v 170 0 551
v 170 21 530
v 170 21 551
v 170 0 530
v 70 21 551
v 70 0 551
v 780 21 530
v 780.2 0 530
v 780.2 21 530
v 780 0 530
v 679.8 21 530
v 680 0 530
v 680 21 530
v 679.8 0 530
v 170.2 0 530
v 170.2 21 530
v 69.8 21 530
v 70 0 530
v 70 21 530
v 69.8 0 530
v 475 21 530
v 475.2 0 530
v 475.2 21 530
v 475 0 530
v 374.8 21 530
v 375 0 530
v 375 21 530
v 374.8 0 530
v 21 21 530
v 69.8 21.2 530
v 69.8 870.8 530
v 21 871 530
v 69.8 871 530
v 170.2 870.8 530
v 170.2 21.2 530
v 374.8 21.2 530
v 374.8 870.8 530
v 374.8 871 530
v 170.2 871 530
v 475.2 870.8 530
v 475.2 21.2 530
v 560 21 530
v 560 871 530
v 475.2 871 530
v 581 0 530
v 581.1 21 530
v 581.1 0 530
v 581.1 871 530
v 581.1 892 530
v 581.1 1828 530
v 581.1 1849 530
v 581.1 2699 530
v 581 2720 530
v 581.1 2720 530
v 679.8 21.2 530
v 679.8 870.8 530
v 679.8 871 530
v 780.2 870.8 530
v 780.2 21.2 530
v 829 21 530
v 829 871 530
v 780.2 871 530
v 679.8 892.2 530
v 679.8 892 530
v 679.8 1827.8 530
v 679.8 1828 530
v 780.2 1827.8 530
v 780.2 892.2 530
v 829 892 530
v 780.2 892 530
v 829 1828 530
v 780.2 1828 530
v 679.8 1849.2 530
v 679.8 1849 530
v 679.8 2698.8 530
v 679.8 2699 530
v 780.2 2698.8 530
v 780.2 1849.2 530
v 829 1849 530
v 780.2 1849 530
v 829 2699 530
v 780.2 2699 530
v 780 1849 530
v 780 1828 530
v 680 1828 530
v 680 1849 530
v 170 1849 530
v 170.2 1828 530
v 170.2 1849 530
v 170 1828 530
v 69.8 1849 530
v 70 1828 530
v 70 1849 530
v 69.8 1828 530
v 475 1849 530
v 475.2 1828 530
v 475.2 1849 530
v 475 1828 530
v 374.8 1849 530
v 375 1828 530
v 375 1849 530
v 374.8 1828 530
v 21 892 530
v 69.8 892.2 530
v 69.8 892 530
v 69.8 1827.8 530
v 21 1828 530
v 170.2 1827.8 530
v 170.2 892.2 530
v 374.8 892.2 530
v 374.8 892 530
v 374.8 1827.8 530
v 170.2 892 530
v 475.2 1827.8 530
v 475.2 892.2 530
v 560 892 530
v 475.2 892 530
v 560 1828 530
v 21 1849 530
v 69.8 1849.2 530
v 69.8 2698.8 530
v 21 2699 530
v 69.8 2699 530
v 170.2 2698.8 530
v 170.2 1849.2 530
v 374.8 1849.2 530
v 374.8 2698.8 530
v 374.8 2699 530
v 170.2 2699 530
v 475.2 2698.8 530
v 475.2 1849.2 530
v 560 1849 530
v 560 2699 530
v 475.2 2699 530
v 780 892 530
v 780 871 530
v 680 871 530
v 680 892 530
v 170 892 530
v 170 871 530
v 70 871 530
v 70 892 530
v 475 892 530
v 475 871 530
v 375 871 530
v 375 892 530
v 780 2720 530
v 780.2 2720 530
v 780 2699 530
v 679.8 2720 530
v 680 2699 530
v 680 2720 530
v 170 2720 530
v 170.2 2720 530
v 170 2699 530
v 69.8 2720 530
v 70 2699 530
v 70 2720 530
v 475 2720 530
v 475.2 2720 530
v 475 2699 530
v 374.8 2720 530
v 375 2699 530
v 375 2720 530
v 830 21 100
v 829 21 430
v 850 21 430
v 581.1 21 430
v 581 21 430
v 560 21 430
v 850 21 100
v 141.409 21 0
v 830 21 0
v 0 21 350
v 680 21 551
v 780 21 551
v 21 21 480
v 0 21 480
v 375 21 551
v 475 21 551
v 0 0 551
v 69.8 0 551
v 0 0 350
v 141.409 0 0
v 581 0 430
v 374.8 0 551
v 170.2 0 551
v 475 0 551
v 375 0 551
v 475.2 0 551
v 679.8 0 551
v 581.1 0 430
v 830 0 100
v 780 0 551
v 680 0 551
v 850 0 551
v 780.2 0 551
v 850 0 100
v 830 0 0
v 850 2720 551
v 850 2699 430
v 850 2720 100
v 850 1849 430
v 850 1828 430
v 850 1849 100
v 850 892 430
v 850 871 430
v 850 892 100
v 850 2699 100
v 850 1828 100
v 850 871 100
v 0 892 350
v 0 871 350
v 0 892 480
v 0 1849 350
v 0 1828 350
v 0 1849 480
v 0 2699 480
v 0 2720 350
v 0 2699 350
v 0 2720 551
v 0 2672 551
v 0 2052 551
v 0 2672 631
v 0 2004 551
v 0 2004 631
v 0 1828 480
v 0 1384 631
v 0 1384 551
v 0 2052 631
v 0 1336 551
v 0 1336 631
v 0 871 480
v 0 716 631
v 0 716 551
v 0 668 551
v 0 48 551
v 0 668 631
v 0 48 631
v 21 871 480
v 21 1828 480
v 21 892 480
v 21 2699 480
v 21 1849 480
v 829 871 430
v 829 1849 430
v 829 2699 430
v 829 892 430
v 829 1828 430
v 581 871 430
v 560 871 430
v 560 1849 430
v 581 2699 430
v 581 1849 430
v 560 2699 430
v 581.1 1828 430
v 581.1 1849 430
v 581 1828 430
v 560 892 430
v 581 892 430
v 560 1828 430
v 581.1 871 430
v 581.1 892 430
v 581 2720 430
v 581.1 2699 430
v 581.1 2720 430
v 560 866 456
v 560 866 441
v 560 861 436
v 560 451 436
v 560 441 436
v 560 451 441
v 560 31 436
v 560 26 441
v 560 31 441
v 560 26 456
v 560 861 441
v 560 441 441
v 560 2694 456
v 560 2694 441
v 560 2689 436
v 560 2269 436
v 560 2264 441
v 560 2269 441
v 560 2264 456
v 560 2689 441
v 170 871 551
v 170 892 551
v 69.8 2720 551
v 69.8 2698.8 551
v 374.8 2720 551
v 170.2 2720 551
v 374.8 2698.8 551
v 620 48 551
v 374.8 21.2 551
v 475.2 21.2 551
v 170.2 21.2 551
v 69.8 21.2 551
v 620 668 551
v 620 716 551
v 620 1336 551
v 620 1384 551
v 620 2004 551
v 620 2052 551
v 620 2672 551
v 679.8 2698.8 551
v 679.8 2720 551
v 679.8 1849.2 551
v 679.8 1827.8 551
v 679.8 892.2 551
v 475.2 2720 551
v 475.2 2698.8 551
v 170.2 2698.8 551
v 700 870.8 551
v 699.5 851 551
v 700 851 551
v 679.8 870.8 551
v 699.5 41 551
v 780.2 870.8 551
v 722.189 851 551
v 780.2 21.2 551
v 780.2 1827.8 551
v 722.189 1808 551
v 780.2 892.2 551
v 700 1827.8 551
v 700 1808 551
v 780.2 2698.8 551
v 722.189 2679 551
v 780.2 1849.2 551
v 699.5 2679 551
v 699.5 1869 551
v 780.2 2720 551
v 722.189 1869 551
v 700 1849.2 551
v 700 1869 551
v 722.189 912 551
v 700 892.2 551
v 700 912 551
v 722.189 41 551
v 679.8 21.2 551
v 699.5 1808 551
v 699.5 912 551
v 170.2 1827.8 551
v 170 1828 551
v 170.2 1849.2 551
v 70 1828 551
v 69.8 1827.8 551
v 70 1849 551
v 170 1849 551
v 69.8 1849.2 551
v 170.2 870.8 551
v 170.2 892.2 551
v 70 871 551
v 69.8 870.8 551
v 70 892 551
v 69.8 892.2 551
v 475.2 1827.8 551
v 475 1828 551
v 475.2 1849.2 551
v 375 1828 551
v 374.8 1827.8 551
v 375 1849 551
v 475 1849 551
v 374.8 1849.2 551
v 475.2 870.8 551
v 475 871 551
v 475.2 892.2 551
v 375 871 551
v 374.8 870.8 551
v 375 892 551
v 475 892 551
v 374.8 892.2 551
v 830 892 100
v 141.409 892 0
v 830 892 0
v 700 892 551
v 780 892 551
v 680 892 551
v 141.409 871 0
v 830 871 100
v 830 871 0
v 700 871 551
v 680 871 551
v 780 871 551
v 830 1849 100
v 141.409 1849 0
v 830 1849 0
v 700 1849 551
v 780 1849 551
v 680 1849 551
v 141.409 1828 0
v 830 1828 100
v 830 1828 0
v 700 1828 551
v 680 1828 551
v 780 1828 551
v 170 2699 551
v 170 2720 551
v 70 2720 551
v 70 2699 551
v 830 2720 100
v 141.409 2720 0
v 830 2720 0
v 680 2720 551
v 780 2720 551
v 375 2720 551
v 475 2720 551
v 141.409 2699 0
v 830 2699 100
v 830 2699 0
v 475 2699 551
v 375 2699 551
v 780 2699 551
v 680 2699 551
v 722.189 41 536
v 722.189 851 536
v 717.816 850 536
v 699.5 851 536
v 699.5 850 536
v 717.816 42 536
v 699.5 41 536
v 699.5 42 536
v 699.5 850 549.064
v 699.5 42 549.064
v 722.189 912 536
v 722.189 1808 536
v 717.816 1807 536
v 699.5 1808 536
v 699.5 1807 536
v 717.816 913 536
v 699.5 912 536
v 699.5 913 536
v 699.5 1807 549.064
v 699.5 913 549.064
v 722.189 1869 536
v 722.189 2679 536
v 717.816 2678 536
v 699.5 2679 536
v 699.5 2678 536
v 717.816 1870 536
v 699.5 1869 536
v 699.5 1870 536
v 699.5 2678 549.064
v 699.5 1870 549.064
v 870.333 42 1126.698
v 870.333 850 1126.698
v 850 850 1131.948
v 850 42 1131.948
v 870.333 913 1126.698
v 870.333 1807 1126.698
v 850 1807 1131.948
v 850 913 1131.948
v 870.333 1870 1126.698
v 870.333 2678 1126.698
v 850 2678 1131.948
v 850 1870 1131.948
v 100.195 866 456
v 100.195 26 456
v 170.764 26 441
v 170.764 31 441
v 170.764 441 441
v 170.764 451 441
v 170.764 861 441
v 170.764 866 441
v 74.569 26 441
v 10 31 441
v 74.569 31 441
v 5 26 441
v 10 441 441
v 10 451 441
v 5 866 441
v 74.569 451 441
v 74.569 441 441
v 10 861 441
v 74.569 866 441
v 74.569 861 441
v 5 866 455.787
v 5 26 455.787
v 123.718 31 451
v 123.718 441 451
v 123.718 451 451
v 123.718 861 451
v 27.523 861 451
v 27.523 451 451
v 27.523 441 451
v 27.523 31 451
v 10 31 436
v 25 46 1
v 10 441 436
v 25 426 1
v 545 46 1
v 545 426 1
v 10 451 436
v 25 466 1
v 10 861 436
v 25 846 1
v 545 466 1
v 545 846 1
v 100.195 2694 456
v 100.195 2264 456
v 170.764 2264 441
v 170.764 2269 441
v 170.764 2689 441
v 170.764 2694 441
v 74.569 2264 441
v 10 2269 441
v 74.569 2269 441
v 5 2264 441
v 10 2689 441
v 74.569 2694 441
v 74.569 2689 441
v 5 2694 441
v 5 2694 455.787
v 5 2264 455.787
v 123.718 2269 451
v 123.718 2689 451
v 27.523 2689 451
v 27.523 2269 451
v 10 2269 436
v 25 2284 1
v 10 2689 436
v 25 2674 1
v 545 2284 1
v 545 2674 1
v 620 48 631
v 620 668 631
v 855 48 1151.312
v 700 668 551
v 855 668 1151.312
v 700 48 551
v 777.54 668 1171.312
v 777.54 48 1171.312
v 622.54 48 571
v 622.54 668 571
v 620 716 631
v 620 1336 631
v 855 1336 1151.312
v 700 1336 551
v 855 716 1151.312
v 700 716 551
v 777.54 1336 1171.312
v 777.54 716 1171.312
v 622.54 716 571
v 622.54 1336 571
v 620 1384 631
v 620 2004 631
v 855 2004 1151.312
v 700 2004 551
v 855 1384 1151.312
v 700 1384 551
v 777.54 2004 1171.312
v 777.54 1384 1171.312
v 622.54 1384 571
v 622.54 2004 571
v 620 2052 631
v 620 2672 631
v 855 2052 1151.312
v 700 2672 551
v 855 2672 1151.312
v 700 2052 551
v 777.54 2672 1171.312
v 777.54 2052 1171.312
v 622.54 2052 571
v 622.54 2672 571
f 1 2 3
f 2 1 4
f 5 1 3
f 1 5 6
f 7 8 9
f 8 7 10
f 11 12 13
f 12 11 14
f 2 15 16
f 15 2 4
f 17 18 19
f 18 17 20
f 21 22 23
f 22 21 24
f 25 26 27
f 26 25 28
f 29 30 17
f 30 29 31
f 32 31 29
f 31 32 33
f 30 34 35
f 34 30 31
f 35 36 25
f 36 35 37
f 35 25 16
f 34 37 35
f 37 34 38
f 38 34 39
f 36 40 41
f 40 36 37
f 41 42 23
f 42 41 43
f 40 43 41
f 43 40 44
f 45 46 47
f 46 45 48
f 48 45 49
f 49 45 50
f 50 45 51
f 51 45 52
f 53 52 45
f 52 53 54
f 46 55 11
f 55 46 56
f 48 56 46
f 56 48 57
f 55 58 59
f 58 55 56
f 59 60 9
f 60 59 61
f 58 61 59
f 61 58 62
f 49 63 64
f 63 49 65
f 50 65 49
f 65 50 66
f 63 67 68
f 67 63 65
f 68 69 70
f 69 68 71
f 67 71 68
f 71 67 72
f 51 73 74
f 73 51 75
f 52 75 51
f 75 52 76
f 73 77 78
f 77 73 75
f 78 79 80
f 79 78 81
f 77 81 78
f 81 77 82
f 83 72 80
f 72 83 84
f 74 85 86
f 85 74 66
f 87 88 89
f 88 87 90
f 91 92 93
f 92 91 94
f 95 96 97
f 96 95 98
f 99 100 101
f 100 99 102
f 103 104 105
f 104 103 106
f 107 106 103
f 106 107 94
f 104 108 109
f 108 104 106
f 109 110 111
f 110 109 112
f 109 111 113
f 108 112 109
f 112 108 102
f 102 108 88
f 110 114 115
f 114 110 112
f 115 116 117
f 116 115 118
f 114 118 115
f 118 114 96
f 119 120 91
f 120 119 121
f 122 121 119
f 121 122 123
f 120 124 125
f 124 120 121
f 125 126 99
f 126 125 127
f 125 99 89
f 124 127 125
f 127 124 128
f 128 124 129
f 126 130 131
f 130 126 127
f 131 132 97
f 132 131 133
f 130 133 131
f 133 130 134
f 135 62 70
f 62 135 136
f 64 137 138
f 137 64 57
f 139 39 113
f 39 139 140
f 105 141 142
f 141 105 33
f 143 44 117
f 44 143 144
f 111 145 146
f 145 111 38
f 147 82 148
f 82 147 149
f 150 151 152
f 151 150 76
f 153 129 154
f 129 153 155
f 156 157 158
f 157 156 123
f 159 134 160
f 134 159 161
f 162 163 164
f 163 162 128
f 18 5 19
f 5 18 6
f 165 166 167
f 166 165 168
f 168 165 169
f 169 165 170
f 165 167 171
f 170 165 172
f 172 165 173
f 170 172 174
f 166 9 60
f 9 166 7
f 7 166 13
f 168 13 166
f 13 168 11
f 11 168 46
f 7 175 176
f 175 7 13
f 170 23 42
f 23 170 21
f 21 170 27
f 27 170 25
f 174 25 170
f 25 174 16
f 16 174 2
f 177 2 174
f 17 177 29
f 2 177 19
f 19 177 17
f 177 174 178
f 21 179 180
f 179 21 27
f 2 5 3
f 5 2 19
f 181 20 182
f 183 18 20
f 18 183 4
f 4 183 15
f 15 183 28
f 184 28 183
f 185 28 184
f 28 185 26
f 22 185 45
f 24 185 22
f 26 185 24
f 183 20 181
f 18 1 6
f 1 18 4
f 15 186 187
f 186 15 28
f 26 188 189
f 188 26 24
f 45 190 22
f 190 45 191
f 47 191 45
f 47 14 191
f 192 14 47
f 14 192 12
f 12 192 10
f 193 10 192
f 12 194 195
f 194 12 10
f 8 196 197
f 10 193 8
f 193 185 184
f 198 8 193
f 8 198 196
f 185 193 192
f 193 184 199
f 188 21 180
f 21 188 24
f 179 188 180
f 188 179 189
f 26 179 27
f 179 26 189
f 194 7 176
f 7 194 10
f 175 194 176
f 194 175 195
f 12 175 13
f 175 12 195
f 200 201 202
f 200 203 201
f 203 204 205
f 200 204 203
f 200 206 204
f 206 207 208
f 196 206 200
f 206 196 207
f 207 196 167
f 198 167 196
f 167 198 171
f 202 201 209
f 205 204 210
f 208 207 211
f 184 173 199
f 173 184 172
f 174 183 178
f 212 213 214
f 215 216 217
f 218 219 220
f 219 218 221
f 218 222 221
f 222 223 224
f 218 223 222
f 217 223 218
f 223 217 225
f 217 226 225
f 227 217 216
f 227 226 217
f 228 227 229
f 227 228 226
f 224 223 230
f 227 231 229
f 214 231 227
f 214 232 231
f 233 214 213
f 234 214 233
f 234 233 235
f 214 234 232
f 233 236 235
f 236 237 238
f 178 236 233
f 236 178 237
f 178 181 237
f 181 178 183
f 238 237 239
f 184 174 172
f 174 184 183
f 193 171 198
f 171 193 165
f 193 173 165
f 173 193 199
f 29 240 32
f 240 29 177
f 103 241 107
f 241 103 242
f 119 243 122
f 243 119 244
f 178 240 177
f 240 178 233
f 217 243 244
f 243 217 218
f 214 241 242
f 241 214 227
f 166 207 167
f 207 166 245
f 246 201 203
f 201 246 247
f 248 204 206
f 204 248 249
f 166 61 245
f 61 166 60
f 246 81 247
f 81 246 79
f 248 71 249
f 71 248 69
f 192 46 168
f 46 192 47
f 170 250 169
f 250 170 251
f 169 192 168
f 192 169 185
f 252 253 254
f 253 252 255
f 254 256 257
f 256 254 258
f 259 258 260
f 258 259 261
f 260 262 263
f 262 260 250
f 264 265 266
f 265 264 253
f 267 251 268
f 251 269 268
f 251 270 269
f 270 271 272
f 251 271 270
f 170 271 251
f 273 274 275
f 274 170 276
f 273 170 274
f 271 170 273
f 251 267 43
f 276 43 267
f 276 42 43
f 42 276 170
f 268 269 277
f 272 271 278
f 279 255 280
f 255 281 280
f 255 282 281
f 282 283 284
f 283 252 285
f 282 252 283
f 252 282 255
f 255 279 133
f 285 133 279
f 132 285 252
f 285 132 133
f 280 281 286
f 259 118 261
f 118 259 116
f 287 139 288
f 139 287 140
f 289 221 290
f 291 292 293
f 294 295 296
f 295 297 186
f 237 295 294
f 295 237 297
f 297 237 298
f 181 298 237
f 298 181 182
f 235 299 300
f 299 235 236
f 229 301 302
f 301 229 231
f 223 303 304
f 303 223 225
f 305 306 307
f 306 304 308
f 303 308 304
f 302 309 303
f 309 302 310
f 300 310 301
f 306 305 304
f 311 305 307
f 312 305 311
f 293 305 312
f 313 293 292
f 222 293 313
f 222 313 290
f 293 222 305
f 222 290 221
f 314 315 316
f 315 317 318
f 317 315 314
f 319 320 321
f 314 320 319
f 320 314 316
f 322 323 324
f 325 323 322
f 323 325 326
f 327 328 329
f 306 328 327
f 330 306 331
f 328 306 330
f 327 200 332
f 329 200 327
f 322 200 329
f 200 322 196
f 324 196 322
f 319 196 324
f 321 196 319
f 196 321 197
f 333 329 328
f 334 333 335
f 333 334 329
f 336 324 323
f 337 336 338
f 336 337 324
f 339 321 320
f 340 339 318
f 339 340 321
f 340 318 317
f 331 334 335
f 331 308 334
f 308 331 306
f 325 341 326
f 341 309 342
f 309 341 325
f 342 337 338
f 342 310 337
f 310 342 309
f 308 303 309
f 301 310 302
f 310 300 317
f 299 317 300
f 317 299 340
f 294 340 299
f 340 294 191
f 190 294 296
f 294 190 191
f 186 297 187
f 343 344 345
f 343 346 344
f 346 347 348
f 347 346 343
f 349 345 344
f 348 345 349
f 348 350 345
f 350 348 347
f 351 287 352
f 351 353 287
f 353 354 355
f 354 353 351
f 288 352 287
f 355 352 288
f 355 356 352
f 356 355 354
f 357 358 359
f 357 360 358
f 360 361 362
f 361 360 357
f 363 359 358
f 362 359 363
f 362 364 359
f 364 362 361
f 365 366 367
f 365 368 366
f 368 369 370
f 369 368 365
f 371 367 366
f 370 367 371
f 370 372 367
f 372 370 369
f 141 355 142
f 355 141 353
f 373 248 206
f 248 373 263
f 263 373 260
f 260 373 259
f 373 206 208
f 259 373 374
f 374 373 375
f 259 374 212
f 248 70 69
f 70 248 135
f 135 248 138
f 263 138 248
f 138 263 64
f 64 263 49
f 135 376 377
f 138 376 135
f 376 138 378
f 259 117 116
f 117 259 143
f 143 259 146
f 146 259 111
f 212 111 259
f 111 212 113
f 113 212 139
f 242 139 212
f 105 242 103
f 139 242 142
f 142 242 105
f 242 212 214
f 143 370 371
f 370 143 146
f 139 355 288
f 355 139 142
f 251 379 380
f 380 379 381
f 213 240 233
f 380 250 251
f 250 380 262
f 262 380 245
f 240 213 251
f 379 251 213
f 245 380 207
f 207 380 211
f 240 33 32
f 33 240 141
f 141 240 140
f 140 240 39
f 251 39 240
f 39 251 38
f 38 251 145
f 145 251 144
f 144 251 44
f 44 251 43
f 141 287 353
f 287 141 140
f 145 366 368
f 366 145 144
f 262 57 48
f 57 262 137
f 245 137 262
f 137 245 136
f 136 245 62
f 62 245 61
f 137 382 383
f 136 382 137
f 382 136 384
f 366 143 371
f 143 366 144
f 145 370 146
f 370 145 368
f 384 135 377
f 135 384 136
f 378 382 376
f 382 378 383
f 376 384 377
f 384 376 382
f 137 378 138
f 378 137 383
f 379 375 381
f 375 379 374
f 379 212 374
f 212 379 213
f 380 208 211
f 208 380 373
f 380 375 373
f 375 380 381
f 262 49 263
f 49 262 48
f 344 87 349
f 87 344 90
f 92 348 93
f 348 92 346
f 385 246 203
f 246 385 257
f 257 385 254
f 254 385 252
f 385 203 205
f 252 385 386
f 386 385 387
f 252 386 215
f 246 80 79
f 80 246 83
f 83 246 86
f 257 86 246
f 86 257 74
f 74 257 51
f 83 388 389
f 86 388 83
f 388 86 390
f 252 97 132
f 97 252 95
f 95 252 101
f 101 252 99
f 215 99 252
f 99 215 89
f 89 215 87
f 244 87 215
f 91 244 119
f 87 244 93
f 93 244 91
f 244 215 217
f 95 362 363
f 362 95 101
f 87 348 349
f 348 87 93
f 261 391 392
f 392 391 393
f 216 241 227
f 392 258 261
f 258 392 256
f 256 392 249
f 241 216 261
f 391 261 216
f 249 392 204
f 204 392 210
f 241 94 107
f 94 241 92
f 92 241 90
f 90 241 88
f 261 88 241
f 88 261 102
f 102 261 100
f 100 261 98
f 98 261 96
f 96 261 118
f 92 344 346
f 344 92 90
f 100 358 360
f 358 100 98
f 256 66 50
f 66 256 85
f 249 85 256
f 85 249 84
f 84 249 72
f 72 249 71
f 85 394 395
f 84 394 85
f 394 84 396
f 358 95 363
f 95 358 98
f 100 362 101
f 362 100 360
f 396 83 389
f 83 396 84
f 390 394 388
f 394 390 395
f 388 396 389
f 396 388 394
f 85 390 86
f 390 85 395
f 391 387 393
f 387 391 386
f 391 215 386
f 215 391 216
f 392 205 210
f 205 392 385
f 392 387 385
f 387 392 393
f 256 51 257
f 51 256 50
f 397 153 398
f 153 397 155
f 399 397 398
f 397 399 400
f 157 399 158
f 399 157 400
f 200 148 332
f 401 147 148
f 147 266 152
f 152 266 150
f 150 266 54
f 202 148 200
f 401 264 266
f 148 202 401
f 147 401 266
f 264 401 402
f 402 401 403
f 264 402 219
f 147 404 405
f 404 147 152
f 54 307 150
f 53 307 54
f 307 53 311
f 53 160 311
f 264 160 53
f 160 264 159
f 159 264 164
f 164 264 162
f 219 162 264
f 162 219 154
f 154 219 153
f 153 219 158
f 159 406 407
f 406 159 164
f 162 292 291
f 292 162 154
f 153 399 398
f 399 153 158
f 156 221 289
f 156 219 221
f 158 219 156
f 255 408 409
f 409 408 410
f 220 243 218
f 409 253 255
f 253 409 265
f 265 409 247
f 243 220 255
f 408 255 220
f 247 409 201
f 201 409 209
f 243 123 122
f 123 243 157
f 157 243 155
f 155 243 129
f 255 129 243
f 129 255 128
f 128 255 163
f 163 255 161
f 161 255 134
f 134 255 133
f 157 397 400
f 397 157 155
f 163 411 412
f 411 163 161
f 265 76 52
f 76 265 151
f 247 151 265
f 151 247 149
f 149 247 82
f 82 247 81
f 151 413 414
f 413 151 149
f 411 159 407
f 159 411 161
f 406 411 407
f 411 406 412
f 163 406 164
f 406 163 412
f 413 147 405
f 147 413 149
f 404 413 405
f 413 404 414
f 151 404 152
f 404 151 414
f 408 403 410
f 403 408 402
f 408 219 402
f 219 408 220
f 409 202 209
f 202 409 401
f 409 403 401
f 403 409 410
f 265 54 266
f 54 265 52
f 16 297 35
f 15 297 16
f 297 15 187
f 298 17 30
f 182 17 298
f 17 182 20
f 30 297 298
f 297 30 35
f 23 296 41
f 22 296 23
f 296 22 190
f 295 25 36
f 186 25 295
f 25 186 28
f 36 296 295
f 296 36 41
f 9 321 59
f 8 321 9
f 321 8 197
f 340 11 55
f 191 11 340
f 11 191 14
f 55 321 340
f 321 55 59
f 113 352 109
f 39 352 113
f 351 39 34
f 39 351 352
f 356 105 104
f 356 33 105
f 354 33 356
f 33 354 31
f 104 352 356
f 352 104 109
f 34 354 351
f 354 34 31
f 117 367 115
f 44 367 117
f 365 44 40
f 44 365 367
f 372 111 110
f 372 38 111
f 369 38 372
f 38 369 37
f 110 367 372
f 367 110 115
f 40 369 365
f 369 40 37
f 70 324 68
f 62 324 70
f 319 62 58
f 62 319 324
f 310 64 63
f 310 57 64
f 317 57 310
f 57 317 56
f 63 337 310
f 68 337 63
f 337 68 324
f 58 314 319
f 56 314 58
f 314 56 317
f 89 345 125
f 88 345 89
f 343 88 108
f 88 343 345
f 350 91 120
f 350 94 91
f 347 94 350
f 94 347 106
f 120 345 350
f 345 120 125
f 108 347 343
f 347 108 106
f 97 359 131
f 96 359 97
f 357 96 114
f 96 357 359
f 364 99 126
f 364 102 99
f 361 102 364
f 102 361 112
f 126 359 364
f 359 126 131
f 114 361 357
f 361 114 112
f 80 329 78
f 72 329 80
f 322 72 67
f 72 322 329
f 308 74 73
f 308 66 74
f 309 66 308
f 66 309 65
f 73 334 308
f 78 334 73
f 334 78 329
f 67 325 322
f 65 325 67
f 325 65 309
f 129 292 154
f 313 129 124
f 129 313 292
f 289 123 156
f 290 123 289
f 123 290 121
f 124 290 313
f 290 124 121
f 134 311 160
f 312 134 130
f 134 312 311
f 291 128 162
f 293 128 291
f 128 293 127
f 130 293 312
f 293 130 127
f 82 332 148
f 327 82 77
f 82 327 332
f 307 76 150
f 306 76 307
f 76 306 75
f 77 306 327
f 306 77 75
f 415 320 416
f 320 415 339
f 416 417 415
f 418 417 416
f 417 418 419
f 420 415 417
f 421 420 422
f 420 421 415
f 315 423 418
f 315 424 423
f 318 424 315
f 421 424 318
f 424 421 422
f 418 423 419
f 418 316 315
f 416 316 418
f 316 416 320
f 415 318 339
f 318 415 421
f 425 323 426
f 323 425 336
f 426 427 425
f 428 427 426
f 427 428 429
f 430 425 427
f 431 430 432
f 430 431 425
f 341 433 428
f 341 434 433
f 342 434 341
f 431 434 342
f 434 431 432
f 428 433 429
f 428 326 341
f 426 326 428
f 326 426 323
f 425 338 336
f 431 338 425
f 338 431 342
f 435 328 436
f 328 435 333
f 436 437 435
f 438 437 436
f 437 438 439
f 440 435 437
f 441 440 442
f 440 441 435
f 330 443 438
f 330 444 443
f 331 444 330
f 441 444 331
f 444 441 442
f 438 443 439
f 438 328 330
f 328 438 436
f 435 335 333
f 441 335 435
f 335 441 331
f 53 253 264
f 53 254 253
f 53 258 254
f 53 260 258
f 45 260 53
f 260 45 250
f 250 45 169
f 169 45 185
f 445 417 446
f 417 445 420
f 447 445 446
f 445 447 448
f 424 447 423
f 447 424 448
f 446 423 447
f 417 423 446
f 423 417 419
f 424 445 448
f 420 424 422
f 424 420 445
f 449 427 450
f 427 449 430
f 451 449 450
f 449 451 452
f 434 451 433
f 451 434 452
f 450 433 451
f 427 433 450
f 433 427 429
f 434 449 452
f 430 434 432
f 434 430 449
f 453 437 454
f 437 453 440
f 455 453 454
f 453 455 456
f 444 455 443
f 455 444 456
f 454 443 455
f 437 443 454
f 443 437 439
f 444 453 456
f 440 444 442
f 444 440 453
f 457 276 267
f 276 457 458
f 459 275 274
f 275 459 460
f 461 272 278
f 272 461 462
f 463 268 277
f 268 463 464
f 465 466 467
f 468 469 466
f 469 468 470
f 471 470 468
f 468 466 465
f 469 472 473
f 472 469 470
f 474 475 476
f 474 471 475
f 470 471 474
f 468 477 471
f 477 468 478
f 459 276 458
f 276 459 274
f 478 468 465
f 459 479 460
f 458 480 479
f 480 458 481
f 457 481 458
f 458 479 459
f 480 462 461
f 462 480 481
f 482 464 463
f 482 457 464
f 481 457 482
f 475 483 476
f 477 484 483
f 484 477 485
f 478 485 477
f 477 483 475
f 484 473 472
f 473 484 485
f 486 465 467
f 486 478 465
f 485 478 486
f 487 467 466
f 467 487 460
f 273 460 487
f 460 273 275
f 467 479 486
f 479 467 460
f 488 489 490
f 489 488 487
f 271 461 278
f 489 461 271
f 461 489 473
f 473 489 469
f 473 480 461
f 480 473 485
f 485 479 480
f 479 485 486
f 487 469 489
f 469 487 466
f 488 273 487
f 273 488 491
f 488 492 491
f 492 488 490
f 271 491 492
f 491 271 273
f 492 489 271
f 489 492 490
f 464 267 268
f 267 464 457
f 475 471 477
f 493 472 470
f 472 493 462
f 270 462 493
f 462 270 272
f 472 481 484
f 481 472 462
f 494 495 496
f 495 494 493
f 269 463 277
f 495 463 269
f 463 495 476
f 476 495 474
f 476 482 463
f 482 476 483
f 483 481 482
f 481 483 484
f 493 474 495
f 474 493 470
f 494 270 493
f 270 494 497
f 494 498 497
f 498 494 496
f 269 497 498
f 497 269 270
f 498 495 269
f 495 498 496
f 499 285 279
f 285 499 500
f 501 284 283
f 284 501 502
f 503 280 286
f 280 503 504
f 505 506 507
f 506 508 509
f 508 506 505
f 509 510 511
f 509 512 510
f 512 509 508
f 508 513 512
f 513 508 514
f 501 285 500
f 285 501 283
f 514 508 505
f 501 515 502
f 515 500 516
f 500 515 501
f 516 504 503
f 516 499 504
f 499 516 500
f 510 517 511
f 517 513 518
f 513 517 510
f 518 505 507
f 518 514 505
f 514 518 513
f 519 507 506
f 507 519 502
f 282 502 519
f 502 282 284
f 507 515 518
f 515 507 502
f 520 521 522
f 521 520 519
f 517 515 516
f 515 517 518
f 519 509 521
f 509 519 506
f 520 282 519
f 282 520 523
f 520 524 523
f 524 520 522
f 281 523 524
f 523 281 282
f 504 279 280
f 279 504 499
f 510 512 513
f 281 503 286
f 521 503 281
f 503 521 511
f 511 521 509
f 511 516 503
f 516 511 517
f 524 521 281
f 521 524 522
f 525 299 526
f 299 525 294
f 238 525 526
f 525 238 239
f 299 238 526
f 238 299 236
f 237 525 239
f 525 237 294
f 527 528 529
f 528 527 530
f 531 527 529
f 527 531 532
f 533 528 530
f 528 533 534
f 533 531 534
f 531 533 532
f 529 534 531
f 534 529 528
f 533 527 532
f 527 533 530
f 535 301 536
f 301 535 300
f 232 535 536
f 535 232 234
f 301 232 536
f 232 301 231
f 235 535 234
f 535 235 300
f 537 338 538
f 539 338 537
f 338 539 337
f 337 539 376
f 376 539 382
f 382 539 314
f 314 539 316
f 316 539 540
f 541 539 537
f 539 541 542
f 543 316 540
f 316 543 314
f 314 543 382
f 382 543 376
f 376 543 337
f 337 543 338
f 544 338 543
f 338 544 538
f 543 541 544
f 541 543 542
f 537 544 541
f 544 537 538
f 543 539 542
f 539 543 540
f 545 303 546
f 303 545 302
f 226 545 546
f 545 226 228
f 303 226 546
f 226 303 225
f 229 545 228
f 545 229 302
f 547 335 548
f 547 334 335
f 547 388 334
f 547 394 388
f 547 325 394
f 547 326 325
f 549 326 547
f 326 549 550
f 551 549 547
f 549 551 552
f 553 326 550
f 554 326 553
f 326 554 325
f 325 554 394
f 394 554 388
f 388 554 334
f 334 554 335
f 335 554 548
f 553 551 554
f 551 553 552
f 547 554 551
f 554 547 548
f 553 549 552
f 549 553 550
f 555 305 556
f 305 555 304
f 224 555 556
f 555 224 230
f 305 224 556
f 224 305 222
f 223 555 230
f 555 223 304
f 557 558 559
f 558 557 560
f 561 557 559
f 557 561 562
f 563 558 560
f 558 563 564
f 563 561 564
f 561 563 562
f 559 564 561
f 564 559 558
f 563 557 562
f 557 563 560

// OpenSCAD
// ==========================================
// Project: Terrace-Bench
// File: Terrace-Bench.scad
// Version: v0.06
// Description: Fully parametric 21mm plywood terrace bench
//              Designed to fit a 276cm wall-to-wall alcove.
//              Fits 4 Ikea SORTERA boxes underneath (2 on left, 2 on right).
//              Fits 62x62cm Ikea garden pillows for seat and backrest.
//              Supports 3 modes: "assembled", "exploded", "parts" (flat lay for CNC).
// Changelog:
//   v0.01 - Initial design
//   v0.02 - Corrected backrest lean, adjusted SORTERA box orientation,
//           added 50mm front reinforcement beam, raised clearance to 530mm
//           (bottom of beam to floor = 480mm), calculated parallel 22-degree
//           toe-kick profile, added 20mm shoulder to hide grooves, and
//           aligned all parts flat on Z=0 plane.
//   v0.03 - Made seat pillow visualization depth dynamically scale with
//           total_depth.
//   v0.04 - Reversed pillow stacking (backrest pillow down first, then seat).
//           Made seat_depth constant (620mm) so the sitting part never changes.
//           When total_depth changes, only the groove slope/position adapts.
//           Increased total_depth to 860mm to keep backrest slope ~14 degrees.
//   v0.05 - Confirmed backrest panel length calculation uses absolute wall distance
//           and touch height, uncoupled from sitting pillow depth.
//   v0.06 - Removed wall-touch-height parameter. Now explicitly defining the
//           backrest panel length (height) and dynamically calculating the slope.
// Author: Zed Coding Agent
// Date: 2026-05-30
// ==========================================

/* [Visualization Options] */
// Mode of display: assembled (3D), exploded (3D), parts (flat lay for CNC export)
mode = "assembled"; // [assembled, exploded, parts]
// Show pillows and Ikea SORTERA boxes
show_accessories = true;

/* [General Dimensions] */
// Wall-to-wall width of the terrace (mm)
total_width = 2720; // [2000:3500]
// Total depth of the bench top (mm) (Increased to 860 to maintain backrest slope)
total_depth = 850; // [750:1100]
// Depth of the sitting area (mm) (Fixed so pillows always fit regardless of total_depth)
seat_depth = 620; // [500:800]
// Thickness of the Ikea garden pillows (mm)
pillow_thickness = 80; // [50:150]
// Clearance height from floor to bottom of bench top (mm) (raised to 530mm so bottom of front apron is 480mm from floor)
clearance_height = 530; // [400:600]
// Plywood sheet thickness (mm)
plywood_thickness = 21; // [12:30]

/* [Compartment Options] */
// Width of the left compartment for SORTERA boxes (mm)
bay_width_left = 850; // [780:1200]
// Width of the right compartment for SORTERA boxes (mm)
bay_width_right = 850; // [780:1200]

/* [Backrest Options] */
// Total length (height) of the backrest wooden panel (mm)
backrest_panel_length = 600; // [400:1000]
// Gap between the backrest panels (mm)
backrest_panel_gap = 2; // [0:10]

/* [Joinery & Details] */
// Height of the toe-kick cutout at bottom-front of supports (mm)
toekick_height = 350; // [0:450]
// Angle of the toe-kick cutout from vertical (degrees) to match Sortera's front slant
toekick_angle = 22; // [0:45]
// Height of the skirting board notch at bottom-back of supports (mm)
skirting_height = 100; // [0:150]
// Depth of the skirting board notch (mm)
skirting_depth = 20; // [0:50]
// Number of tenons per support wall
tenon_count = 3; // [1:5]
// Width of each tenon along the depth of the bench (mm)
tenon_width = 100; // [50:200]
// Height of the structural aprons (stretchers) (mm)
apron_height = 100; // [60:150]
// Height of the vertical front reinforcement apron (mm)
front_apron_height = 50; // [30:100]
// X-coordinate of the middle apron (serves as box stop) (mm)
apron_middle_x = 560; // [400:700]

/* [Groove Options] */
// Whether the groove goes all the way through (through-slot)
groove_through = false;
// Depth of the pocket groove (if not through-slot) (mm)
groove_depth = 15; // [5:20]
// Solid wood shoulder (margin) left at the end of each bay section (mm)
groove_shoulder = 20; // [10:50]
// Tolerance clearance (slop) for joints/grooves (mm)
groove_slop = 1.0; // [0.1:2.0]
// Mortise clearance slop for tenons (mm)
mortise_slop = 0.2; // [0.0:1.0]

/* [Calculated Constants] */
// Middle bay width is calculated automatically to maintain total width
bay_width_middle = total_width - 4 * plywood_thickness - bay_width_left - bay_width_right;

// Calculated toe-kick depth based on height and angle
toekick_depth = toekick_height * tan(toekick_angle);

// Dynamic Backrest Position Logic
// The front of the groove is placed to exactly fit the seat_depth + the thickness of the backrest pillow.
groove_front_x = seat_depth + pillow_thickness;
// The distance from the groove to the back wall dictates the backrest angle.
groove_distance_calc = total_depth - groove_front_x;

// Backrest angle calculation (hypotenuse is backrest_panel_length, opposite is groove_distance_calc)
// Note: This calculates the exact angle required for the top of the panel to touch the back wall.
backrest_angle = asin(groove_distance_calc / backrest_panel_length);
L_total = backrest_panel_length;
groove_width_calc = plywood_thickness / cos(backrest_angle) + groove_slop;

// Apron X positions
apron_back_x = total_depth - plywood_thickness;

// Bay intervals: [start_y, end_y]
bay_intervals = [
    [plywood_thickness, plywood_thickness + bay_width_left],
    [2 * plywood_thickness + bay_width_left, 2 * plywood_thickness + bay_width_left + bay_width_middle],
    [3 * plywood_thickness + bay_width_left + bay_width_middle, total_width - plywood_thickness]
];

// Assembled Y-positions of the 4 support walls
support_y_positions = [
    0,
    plywood_thickness + bay_width_left,
    total_width - 2 * plywood_thickness - bay_width_right,
    total_width - plywood_thickness
];

// Nesting gap for "parts" mode flat lay
nesting_gap = 50;


// ==========================================
// Main Entry Point
// ==========================================

if (mode == "assembled") {
    assembly();
} else if (mode == "exploded") {
    exploded_assembly();
} else if (mode == "parts") {
    flat_lay_parts();
}


// ==========================================
// Modular Components
// ==========================================

// 1. Support Wall
// Local coordinates:
// X: [0, total_depth]
// Y: [0, plywood_thickness]
// Z: [0, clearance_height] (tenons go up to clearance_height + plywood_thickness)
module support_wall() {
    difference() {
        union() {
            // Main rectangular wall panel
            cube([total_depth, plywood_thickness, clearance_height]);

            // Tenons at the top for locking into bench top
            start_x = 120;
            end_x = total_depth - 120;
            for (i = [0 : tenon_count - 1]) {
                x_center = (tenon_count > 1) ?
                    (start_x + i * (end_x - start_x) / (tenon_count - 1)) :
                    (total_depth / 2);
                translate([x_center - tenon_width / 2, 0, clearance_height])
                    cube([tenon_width, plywood_thickness, plywood_thickness]);
            }
        }

        // Toe-kick cutout (diagonal at bottom-front)
        if (toekick_depth > 0 && toekick_height > 0) {
            translate([0, plywood_thickness + 0.05, 0])
                rotate([90, 0, 0])
                linear_extrude(height = plywood_thickness + 0.1)
                polygon([[0, 0], [toekick_depth, 0], [0, toekick_height]]);
        }

        // Skirting board notch (at bottom-back)
        if (skirting_depth > 0 && skirting_height > 0) {
            translate([total_depth - skirting_depth, -0.1, -0.1])
                cube([skirting_depth + 0.2, plywood_thickness + 0.2, skirting_height + 0.1]);
        }

        // Front Apron notch (at top-front vertical reinforcement)
        translate([-0.1, -0.1, clearance_height - front_apron_height])
            cube([plywood_thickness + 0.1, plywood_thickness + 0.2, front_apron_height + 0.1]);

        // Back Apron notch (at top-back)
        translate([apron_back_x, -0.1, clearance_height - apron_height])
            cube([plywood_thickness + 0.1, plywood_thickness + 0.2, apron_height + 0.1]);

        // Middle Apron notch (at top-middle)
        translate([apron_middle_x, -0.1, clearance_height - apron_height])
            cube([plywood_thickness + 0.1, plywood_thickness + 0.2, apron_height + 0.1]);
    }
}

// Helper: Generates tenon mortises for the bench top
module all_support_tenon_mortises() {
    for (y = support_y_positions) {
        translate([0, y, clearance_height]) {
            start_x = 120;
            end_x = total_depth - 120;
            for (i = [0 : tenon_count - 1]) {
                x_center = (tenon_count > 1) ?
                    (start_x + i * (end_x - start_x) / (tenon_count - 1)) :
                    (total_depth / 2);
                translate([
                    x_center - tenon_width / 2 - mortise_slop,
                    -mortise_slop,
                    -0.1
                ])
                    cube([
                        tenon_width + 2 * mortise_slop,
                        plywood_thickness + 2 * mortise_slop,
                        plywood_thickness + 0.2
                    ]);
            }
        }
    }
}

// Helper: Generates backrest grooves in the bench top
module backrest_grooves() {
    for (interval = bay_intervals) {
        y_start = interval[0] + groove_shoulder;
        y_end = interval[1] - groove_shoulder;
        y_len = y_end - y_start;

        translate([
            groove_front_x - groove_slop / 2,
            y_start,
            groove_through ? -0.1 : (plywood_thickness - groove_depth)
        ])
            cube([
                groove_width_calc,
                y_len,
                groove_through ? (plywood_thickness + 0.2) : (groove_depth + 0.1)
            ]);
    }
}

// 2. Bench Top
// Local coordinates:
// X: [0, total_depth]
// Y: [0, total_width]
// Z: [0, plywood_thickness]
module bench_top() {
    difference() {
        // Main flat bench top
        cube([total_depth, total_width, plywood_thickness]);

        // Subtraction of mortises (aligned to bench top height)
        translate([0, 0, -clearance_height])
            all_support_tenon_mortises();

        // Subtraction of grooves
        backrest_grooves();
    }
}

// 3. Structural Aprons (Back & Middle Stretchers)
// Local coordinates:
// X: [0, plywood_thickness]
// Y: [0, total_width]
// Z: [0, apron_height]
module apron() {
    cube([plywood_thickness, total_width, apron_height]);
}

// 3b. Vertical Front Reinforcement Apron
// Local coordinates:
// X: [0, plywood_thickness]
// Y: [0, total_width]
// Z: [0, front_apron_height]
module front_apron() {
    cube([plywood_thickness, total_width, front_apron_height]);
}

// 4. Backrest Panel
// Local coordinates:
// X: [0, plywood_thickness]
// Y: [0, panel_width]
// Z: [-groove_depth, L_total] (slanted)
module backrest_panel(panel_width) {
    // Note: To simplify CNC fabrication, the panel is drawn flat.
    // The bottom edge is perpendicular to its faces. Slit clearance in the groove allows tilting.
    translate([0, 0, -groove_depth])
        cube([plywood_thickness, panel_width, L_total + groove_depth]);
}


// ==========================================
// Assembly Layouts
// ==========================================

// Full 3D Assembled view
module assembly() {
    // Support walls (Wood Color)
    color("burlywood") {
        for (y = support_y_positions) {
            translate([0, y, 0])
                support_wall();
        }
    }

    // Bench Top (Wood Color)
    color("peru") {
        translate([0, 0, clearance_height])
            bench_top();
    }

    // Aprons (Darker wood)
    color("sienna") {
        // Front Apron (Vertical Reinforcement)
        translate([0, 0, clearance_height - front_apron_height])
            front_apron();
        // Back Apron
        translate([apron_back_x, 0, clearance_height - apron_height])
            apron();
        // Middle Apron
        translate([apron_middle_x, 0, clearance_height - apron_height])
            apron();
    }

    // Backrest Panels (Teak Color)
    color("darkgoldenrod") {
        for (interval = bay_intervals) {
            y_start = interval[0] + groove_shoulder;
            y_end = interval[1] - groove_shoulder;
            panel_width = (y_end - y_start) - backrest_panel_gap;

            translate([
                groove_front_x,
                y_start + backrest_panel_gap / 2,
                clearance_height + plywood_thickness
            ])
                rotate([0, backrest_angle, 0])
                backrest_panel(panel_width);
        }
    }

    // Accessories: Sortera boxes and Pillows
    if (show_accessories) {
        place_sortera_boxes();
        place_pillows();
    }
}

// 3D Exploded view to show details and joinery
module exploded_assembly() {
    explode_z = 150;
    explode_y = 50;

    // Support walls (Wood Color) - pushed outward on Y and downward in Z
    color("burlywood") {
        // Support 0 (far left)
        translate([0, -explode_y * 1.5, -explode_z / 2])
            support_wall();
        // Support 1 (left middle)
        translate([0, support_y_positions[1] - explode_y * 0.5, -explode_z / 2])
            support_wall();
        // Support 2 (right middle)
        translate([0, support_y_positions[2] + explode_y * 0.5, -explode_z / 2])
            support_wall();
        // Support 3 (far right)
        translate([0, support_y_positions[3] + explode_y * 1.5, -explode_z / 2])
            support_wall();
    }

    // Bench Top (Wood Color) - lifted up
    color("peru") {
        translate([0, 0, clearance_height + explode_z])
            bench_top();
    }

    // Aprons - pushed downward and outward
    color("sienna") {
        // Front Apron - pushed forward
        translate([-100, 0, clearance_height - front_apron_height - explode_z / 2])
            front_apron();
        // Back Apron - pushed backward
        translate([apron_back_x + 80, 0, clearance_height - apron_height - explode_z / 2])
            apron();
        // Middle Apron - pushed down
        translate([apron_middle_x, 0, clearance_height - apron_height - explode_z])
            apron();
    }

    // Backrest Panels - lifted up along angle
    color("darkgoldenrod") {
        for (interval = bay_intervals) {
            y_start = interval[0] + groove_shoulder;
            y_end = interval[1] - groove_shoulder;
            panel_width = (y_end - y_start) - backrest_panel_gap;

            // Slanted vector translation
            slant_x = explode_z * sin(backrest_angle);
            slant_z = explode_z * cos(backrest_angle) + explode_z;

            translate([
                groove_front_x + slant_x,
                y_start + backrest_panel_gap / 2,
                clearance_height + plywood_thickness + slant_z
            ])
                rotate([0, backrest_angle, 0])
                backrest_panel(panel_width);
        }
    }

    // Accessories are hidden in exploded mode to keep it clear
}

// Flat layout of all panels for CNC toolpath export
module flat_lay_parts() {
    // Nesting Column 0: Bench Top (No rotation needed)
    color("peru") {
        translate([0, 0, 0])
            bench_top();
    }

    // Nesting Column 1: 4 Support Walls (rotated flat to XY plane)
    color("burlywood") {
        wall_height_flat = clearance_height + plywood_thickness;
        for (i = [0 : 3]) {
            translate([
                total_depth + nesting_gap,
                i * (wall_height_flat + nesting_gap),
                0
            ])
                translate([0, wall_height_flat, 0])
                rotate([90, 0, 0])
                support_wall();
        }
    }

    // Nesting Column 2: 3 Backrest Panels (rotated flat to XY plane)
    color("darkgoldenrod") {
        backrest_len_flat = L_total + groove_depth;

        // Panel 0: Left
        y_start_0 = bay_intervals[0][0] + groove_shoulder;
        y_end_0 = bay_intervals[0][1] - groove_shoulder;
        width_0 = (y_end_0 - y_start_0) - backrest_panel_gap;
        translate([
            2 * total_depth + 2 * nesting_gap,
            0,
            0
        ])
            cube([backrest_len_flat, width_0, plywood_thickness]);

        // Panel 1: Middle
        y_start_1 = bay_intervals[1][0] + groove_shoulder;
        y_end_1 = bay_intervals[1][1] - groove_shoulder;
        width_1 = (y_end_1 - y_start_1) - backrest_panel_gap;
        translate([
            2 * total_depth + 2 * nesting_gap,
            width_0 + nesting_gap,
            0
        ])
            cube([backrest_len_flat, width_1, plywood_thickness]);

        // Panel 2: Right
        y_start_2 = bay_intervals[2][0] + groove_shoulder;
        y_end_2 = bay_intervals[2][1] - groove_shoulder;
        width_2 = (y_end_2 - y_start_2) - backrest_panel_gap;
        translate([
            2 * total_depth + 2 * nesting_gap,
            width_0 + width_1 + 2 * nesting_gap,
            0
        ])
            cube([backrest_len_flat, width_2, plywood_thickness]);
    }

    // Nesting Column 3: Aprons (rotated flat)
    color("sienna") {
        // Back Apron
        translate([
            2 * total_depth + (L_total + groove_depth) + 3 * nesting_gap,
            0,
            plywood_thickness
        ])
            rotate([0, 90, 0])
            apron();

        // Middle Apron
        translate([
            2 * total_depth + (L_total + groove_depth) + 3 * nesting_gap + apron_height + nesting_gap,
            0,
            plywood_thickness
        ])
            rotate([0, 90, 0])
            apron();

        // Front Apron (Vertical Reinforcement)
        translate([
            2 * total_depth + (L_total + groove_depth) + 3 * nesting_gap + 2 * apron_height + 2 * nesting_gap,
            0,
            plywood_thickness
        ])
            rotate([0, 90, 0])
            front_apron();
    }
}


// ==========================================
// Accessories (Visualization Helpers)
// ==========================================

// Mock-up of a SORTERA 60L box (550 x 410 x 450 mm)
module sortera_box() {
    color("whitesmoke", 0.75) {
        // Tapered body
        hull() {
            translate([15, 15, 0])
                cube([520, 380, 5]);
            translate([0, 0, 435])
                cube([550, 410, 15]);
        }
        // Lid (with front hinge slope)
        translate([-5, -5, 440])
            difference() {
                cube([560, 420, 15]);
                // Slope cutout on front (at X = 0)
                translate([-1, -1, 15])
                    rotate([0, 12, 0])
                    cube([200, 422, 20]);
            }
    }
}

// Place the 4 SORTERA boxes in left and right bays
module place_sortera_boxes() {
    box_width = 410;
    // Left Bay Boxes
    y_gap_left = (bay_width_left - 2 * box_width) / 3;
    translate([10, plywood_thickness + y_gap_left, 1])
        sortera_box();
    translate([10, plywood_thickness + 2 * y_gap_left + box_width, 1])
        sortera_box();

    // Right Bay Boxes
    y_gap_right = (bay_width_right - 2 * box_width) / 3;
    translate([10, total_width - plywood_thickness - 2 * y_gap_right - box_width, 1])
        sortera_box();
    translate([10, total_width - plywood_thickness - y_gap_right - box_width, 1])
        sortera_box();
}

// Place sitting and backrest cushions
module place_pillows() {
    pillow_width = 620;

    // Automatically space 4 pillows side by side along the terrace bench
    y_gap = (total_width - 4 * pillow_width) / 5;

    for (i = [0 : 3]) {
        y_pos = y_gap + i * (pillow_width + y_gap);

        // Seat cushion (Light Grey) - placed in front of the backrest
        color("silver") {
            translate([0, y_pos, clearance_height + plywood_thickness])
                cube([seat_depth, pillow_width, pillow_thickness]);
        }

        // Backrest cushion (Slightly darker slate blue/grey)
        color("slategray") {
            // Put down the backrest pillow first. It sits directly on the bench top.
            // It leans perfectly against the front of the backrest panel.
            translate([
                groove_front_x,
                y_pos,
                clearance_height + plywood_thickness
            ])
                rotate([0, backrest_angle, 0])
                translate([-pillow_thickness, 0, 0])
                cube([pillow_thickness, pillow_width, 620]); // Standard IKEA backrest pillow height
        }
    }
}
